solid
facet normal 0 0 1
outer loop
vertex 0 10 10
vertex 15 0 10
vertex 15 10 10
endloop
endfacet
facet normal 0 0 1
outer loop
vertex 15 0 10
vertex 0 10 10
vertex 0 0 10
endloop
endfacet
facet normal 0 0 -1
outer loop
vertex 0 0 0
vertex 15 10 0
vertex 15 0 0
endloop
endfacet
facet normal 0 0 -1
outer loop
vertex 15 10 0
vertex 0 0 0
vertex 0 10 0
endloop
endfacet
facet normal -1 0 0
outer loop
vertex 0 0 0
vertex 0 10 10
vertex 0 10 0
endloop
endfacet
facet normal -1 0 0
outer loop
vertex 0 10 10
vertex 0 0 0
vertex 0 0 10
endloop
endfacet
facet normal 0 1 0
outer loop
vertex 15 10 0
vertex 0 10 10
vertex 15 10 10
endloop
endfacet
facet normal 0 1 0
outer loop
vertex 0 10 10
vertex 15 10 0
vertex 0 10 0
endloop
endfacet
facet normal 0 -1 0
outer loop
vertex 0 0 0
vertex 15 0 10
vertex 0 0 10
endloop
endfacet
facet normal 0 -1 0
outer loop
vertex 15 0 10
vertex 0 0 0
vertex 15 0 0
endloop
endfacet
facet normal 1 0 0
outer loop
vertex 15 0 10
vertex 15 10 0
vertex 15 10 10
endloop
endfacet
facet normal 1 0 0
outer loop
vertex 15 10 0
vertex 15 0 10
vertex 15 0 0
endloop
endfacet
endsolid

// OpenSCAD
// two overlapping cubes: later wins (blue)
color("red") cube(10);
color("blue") translate([5,0,0]) cube(10);
